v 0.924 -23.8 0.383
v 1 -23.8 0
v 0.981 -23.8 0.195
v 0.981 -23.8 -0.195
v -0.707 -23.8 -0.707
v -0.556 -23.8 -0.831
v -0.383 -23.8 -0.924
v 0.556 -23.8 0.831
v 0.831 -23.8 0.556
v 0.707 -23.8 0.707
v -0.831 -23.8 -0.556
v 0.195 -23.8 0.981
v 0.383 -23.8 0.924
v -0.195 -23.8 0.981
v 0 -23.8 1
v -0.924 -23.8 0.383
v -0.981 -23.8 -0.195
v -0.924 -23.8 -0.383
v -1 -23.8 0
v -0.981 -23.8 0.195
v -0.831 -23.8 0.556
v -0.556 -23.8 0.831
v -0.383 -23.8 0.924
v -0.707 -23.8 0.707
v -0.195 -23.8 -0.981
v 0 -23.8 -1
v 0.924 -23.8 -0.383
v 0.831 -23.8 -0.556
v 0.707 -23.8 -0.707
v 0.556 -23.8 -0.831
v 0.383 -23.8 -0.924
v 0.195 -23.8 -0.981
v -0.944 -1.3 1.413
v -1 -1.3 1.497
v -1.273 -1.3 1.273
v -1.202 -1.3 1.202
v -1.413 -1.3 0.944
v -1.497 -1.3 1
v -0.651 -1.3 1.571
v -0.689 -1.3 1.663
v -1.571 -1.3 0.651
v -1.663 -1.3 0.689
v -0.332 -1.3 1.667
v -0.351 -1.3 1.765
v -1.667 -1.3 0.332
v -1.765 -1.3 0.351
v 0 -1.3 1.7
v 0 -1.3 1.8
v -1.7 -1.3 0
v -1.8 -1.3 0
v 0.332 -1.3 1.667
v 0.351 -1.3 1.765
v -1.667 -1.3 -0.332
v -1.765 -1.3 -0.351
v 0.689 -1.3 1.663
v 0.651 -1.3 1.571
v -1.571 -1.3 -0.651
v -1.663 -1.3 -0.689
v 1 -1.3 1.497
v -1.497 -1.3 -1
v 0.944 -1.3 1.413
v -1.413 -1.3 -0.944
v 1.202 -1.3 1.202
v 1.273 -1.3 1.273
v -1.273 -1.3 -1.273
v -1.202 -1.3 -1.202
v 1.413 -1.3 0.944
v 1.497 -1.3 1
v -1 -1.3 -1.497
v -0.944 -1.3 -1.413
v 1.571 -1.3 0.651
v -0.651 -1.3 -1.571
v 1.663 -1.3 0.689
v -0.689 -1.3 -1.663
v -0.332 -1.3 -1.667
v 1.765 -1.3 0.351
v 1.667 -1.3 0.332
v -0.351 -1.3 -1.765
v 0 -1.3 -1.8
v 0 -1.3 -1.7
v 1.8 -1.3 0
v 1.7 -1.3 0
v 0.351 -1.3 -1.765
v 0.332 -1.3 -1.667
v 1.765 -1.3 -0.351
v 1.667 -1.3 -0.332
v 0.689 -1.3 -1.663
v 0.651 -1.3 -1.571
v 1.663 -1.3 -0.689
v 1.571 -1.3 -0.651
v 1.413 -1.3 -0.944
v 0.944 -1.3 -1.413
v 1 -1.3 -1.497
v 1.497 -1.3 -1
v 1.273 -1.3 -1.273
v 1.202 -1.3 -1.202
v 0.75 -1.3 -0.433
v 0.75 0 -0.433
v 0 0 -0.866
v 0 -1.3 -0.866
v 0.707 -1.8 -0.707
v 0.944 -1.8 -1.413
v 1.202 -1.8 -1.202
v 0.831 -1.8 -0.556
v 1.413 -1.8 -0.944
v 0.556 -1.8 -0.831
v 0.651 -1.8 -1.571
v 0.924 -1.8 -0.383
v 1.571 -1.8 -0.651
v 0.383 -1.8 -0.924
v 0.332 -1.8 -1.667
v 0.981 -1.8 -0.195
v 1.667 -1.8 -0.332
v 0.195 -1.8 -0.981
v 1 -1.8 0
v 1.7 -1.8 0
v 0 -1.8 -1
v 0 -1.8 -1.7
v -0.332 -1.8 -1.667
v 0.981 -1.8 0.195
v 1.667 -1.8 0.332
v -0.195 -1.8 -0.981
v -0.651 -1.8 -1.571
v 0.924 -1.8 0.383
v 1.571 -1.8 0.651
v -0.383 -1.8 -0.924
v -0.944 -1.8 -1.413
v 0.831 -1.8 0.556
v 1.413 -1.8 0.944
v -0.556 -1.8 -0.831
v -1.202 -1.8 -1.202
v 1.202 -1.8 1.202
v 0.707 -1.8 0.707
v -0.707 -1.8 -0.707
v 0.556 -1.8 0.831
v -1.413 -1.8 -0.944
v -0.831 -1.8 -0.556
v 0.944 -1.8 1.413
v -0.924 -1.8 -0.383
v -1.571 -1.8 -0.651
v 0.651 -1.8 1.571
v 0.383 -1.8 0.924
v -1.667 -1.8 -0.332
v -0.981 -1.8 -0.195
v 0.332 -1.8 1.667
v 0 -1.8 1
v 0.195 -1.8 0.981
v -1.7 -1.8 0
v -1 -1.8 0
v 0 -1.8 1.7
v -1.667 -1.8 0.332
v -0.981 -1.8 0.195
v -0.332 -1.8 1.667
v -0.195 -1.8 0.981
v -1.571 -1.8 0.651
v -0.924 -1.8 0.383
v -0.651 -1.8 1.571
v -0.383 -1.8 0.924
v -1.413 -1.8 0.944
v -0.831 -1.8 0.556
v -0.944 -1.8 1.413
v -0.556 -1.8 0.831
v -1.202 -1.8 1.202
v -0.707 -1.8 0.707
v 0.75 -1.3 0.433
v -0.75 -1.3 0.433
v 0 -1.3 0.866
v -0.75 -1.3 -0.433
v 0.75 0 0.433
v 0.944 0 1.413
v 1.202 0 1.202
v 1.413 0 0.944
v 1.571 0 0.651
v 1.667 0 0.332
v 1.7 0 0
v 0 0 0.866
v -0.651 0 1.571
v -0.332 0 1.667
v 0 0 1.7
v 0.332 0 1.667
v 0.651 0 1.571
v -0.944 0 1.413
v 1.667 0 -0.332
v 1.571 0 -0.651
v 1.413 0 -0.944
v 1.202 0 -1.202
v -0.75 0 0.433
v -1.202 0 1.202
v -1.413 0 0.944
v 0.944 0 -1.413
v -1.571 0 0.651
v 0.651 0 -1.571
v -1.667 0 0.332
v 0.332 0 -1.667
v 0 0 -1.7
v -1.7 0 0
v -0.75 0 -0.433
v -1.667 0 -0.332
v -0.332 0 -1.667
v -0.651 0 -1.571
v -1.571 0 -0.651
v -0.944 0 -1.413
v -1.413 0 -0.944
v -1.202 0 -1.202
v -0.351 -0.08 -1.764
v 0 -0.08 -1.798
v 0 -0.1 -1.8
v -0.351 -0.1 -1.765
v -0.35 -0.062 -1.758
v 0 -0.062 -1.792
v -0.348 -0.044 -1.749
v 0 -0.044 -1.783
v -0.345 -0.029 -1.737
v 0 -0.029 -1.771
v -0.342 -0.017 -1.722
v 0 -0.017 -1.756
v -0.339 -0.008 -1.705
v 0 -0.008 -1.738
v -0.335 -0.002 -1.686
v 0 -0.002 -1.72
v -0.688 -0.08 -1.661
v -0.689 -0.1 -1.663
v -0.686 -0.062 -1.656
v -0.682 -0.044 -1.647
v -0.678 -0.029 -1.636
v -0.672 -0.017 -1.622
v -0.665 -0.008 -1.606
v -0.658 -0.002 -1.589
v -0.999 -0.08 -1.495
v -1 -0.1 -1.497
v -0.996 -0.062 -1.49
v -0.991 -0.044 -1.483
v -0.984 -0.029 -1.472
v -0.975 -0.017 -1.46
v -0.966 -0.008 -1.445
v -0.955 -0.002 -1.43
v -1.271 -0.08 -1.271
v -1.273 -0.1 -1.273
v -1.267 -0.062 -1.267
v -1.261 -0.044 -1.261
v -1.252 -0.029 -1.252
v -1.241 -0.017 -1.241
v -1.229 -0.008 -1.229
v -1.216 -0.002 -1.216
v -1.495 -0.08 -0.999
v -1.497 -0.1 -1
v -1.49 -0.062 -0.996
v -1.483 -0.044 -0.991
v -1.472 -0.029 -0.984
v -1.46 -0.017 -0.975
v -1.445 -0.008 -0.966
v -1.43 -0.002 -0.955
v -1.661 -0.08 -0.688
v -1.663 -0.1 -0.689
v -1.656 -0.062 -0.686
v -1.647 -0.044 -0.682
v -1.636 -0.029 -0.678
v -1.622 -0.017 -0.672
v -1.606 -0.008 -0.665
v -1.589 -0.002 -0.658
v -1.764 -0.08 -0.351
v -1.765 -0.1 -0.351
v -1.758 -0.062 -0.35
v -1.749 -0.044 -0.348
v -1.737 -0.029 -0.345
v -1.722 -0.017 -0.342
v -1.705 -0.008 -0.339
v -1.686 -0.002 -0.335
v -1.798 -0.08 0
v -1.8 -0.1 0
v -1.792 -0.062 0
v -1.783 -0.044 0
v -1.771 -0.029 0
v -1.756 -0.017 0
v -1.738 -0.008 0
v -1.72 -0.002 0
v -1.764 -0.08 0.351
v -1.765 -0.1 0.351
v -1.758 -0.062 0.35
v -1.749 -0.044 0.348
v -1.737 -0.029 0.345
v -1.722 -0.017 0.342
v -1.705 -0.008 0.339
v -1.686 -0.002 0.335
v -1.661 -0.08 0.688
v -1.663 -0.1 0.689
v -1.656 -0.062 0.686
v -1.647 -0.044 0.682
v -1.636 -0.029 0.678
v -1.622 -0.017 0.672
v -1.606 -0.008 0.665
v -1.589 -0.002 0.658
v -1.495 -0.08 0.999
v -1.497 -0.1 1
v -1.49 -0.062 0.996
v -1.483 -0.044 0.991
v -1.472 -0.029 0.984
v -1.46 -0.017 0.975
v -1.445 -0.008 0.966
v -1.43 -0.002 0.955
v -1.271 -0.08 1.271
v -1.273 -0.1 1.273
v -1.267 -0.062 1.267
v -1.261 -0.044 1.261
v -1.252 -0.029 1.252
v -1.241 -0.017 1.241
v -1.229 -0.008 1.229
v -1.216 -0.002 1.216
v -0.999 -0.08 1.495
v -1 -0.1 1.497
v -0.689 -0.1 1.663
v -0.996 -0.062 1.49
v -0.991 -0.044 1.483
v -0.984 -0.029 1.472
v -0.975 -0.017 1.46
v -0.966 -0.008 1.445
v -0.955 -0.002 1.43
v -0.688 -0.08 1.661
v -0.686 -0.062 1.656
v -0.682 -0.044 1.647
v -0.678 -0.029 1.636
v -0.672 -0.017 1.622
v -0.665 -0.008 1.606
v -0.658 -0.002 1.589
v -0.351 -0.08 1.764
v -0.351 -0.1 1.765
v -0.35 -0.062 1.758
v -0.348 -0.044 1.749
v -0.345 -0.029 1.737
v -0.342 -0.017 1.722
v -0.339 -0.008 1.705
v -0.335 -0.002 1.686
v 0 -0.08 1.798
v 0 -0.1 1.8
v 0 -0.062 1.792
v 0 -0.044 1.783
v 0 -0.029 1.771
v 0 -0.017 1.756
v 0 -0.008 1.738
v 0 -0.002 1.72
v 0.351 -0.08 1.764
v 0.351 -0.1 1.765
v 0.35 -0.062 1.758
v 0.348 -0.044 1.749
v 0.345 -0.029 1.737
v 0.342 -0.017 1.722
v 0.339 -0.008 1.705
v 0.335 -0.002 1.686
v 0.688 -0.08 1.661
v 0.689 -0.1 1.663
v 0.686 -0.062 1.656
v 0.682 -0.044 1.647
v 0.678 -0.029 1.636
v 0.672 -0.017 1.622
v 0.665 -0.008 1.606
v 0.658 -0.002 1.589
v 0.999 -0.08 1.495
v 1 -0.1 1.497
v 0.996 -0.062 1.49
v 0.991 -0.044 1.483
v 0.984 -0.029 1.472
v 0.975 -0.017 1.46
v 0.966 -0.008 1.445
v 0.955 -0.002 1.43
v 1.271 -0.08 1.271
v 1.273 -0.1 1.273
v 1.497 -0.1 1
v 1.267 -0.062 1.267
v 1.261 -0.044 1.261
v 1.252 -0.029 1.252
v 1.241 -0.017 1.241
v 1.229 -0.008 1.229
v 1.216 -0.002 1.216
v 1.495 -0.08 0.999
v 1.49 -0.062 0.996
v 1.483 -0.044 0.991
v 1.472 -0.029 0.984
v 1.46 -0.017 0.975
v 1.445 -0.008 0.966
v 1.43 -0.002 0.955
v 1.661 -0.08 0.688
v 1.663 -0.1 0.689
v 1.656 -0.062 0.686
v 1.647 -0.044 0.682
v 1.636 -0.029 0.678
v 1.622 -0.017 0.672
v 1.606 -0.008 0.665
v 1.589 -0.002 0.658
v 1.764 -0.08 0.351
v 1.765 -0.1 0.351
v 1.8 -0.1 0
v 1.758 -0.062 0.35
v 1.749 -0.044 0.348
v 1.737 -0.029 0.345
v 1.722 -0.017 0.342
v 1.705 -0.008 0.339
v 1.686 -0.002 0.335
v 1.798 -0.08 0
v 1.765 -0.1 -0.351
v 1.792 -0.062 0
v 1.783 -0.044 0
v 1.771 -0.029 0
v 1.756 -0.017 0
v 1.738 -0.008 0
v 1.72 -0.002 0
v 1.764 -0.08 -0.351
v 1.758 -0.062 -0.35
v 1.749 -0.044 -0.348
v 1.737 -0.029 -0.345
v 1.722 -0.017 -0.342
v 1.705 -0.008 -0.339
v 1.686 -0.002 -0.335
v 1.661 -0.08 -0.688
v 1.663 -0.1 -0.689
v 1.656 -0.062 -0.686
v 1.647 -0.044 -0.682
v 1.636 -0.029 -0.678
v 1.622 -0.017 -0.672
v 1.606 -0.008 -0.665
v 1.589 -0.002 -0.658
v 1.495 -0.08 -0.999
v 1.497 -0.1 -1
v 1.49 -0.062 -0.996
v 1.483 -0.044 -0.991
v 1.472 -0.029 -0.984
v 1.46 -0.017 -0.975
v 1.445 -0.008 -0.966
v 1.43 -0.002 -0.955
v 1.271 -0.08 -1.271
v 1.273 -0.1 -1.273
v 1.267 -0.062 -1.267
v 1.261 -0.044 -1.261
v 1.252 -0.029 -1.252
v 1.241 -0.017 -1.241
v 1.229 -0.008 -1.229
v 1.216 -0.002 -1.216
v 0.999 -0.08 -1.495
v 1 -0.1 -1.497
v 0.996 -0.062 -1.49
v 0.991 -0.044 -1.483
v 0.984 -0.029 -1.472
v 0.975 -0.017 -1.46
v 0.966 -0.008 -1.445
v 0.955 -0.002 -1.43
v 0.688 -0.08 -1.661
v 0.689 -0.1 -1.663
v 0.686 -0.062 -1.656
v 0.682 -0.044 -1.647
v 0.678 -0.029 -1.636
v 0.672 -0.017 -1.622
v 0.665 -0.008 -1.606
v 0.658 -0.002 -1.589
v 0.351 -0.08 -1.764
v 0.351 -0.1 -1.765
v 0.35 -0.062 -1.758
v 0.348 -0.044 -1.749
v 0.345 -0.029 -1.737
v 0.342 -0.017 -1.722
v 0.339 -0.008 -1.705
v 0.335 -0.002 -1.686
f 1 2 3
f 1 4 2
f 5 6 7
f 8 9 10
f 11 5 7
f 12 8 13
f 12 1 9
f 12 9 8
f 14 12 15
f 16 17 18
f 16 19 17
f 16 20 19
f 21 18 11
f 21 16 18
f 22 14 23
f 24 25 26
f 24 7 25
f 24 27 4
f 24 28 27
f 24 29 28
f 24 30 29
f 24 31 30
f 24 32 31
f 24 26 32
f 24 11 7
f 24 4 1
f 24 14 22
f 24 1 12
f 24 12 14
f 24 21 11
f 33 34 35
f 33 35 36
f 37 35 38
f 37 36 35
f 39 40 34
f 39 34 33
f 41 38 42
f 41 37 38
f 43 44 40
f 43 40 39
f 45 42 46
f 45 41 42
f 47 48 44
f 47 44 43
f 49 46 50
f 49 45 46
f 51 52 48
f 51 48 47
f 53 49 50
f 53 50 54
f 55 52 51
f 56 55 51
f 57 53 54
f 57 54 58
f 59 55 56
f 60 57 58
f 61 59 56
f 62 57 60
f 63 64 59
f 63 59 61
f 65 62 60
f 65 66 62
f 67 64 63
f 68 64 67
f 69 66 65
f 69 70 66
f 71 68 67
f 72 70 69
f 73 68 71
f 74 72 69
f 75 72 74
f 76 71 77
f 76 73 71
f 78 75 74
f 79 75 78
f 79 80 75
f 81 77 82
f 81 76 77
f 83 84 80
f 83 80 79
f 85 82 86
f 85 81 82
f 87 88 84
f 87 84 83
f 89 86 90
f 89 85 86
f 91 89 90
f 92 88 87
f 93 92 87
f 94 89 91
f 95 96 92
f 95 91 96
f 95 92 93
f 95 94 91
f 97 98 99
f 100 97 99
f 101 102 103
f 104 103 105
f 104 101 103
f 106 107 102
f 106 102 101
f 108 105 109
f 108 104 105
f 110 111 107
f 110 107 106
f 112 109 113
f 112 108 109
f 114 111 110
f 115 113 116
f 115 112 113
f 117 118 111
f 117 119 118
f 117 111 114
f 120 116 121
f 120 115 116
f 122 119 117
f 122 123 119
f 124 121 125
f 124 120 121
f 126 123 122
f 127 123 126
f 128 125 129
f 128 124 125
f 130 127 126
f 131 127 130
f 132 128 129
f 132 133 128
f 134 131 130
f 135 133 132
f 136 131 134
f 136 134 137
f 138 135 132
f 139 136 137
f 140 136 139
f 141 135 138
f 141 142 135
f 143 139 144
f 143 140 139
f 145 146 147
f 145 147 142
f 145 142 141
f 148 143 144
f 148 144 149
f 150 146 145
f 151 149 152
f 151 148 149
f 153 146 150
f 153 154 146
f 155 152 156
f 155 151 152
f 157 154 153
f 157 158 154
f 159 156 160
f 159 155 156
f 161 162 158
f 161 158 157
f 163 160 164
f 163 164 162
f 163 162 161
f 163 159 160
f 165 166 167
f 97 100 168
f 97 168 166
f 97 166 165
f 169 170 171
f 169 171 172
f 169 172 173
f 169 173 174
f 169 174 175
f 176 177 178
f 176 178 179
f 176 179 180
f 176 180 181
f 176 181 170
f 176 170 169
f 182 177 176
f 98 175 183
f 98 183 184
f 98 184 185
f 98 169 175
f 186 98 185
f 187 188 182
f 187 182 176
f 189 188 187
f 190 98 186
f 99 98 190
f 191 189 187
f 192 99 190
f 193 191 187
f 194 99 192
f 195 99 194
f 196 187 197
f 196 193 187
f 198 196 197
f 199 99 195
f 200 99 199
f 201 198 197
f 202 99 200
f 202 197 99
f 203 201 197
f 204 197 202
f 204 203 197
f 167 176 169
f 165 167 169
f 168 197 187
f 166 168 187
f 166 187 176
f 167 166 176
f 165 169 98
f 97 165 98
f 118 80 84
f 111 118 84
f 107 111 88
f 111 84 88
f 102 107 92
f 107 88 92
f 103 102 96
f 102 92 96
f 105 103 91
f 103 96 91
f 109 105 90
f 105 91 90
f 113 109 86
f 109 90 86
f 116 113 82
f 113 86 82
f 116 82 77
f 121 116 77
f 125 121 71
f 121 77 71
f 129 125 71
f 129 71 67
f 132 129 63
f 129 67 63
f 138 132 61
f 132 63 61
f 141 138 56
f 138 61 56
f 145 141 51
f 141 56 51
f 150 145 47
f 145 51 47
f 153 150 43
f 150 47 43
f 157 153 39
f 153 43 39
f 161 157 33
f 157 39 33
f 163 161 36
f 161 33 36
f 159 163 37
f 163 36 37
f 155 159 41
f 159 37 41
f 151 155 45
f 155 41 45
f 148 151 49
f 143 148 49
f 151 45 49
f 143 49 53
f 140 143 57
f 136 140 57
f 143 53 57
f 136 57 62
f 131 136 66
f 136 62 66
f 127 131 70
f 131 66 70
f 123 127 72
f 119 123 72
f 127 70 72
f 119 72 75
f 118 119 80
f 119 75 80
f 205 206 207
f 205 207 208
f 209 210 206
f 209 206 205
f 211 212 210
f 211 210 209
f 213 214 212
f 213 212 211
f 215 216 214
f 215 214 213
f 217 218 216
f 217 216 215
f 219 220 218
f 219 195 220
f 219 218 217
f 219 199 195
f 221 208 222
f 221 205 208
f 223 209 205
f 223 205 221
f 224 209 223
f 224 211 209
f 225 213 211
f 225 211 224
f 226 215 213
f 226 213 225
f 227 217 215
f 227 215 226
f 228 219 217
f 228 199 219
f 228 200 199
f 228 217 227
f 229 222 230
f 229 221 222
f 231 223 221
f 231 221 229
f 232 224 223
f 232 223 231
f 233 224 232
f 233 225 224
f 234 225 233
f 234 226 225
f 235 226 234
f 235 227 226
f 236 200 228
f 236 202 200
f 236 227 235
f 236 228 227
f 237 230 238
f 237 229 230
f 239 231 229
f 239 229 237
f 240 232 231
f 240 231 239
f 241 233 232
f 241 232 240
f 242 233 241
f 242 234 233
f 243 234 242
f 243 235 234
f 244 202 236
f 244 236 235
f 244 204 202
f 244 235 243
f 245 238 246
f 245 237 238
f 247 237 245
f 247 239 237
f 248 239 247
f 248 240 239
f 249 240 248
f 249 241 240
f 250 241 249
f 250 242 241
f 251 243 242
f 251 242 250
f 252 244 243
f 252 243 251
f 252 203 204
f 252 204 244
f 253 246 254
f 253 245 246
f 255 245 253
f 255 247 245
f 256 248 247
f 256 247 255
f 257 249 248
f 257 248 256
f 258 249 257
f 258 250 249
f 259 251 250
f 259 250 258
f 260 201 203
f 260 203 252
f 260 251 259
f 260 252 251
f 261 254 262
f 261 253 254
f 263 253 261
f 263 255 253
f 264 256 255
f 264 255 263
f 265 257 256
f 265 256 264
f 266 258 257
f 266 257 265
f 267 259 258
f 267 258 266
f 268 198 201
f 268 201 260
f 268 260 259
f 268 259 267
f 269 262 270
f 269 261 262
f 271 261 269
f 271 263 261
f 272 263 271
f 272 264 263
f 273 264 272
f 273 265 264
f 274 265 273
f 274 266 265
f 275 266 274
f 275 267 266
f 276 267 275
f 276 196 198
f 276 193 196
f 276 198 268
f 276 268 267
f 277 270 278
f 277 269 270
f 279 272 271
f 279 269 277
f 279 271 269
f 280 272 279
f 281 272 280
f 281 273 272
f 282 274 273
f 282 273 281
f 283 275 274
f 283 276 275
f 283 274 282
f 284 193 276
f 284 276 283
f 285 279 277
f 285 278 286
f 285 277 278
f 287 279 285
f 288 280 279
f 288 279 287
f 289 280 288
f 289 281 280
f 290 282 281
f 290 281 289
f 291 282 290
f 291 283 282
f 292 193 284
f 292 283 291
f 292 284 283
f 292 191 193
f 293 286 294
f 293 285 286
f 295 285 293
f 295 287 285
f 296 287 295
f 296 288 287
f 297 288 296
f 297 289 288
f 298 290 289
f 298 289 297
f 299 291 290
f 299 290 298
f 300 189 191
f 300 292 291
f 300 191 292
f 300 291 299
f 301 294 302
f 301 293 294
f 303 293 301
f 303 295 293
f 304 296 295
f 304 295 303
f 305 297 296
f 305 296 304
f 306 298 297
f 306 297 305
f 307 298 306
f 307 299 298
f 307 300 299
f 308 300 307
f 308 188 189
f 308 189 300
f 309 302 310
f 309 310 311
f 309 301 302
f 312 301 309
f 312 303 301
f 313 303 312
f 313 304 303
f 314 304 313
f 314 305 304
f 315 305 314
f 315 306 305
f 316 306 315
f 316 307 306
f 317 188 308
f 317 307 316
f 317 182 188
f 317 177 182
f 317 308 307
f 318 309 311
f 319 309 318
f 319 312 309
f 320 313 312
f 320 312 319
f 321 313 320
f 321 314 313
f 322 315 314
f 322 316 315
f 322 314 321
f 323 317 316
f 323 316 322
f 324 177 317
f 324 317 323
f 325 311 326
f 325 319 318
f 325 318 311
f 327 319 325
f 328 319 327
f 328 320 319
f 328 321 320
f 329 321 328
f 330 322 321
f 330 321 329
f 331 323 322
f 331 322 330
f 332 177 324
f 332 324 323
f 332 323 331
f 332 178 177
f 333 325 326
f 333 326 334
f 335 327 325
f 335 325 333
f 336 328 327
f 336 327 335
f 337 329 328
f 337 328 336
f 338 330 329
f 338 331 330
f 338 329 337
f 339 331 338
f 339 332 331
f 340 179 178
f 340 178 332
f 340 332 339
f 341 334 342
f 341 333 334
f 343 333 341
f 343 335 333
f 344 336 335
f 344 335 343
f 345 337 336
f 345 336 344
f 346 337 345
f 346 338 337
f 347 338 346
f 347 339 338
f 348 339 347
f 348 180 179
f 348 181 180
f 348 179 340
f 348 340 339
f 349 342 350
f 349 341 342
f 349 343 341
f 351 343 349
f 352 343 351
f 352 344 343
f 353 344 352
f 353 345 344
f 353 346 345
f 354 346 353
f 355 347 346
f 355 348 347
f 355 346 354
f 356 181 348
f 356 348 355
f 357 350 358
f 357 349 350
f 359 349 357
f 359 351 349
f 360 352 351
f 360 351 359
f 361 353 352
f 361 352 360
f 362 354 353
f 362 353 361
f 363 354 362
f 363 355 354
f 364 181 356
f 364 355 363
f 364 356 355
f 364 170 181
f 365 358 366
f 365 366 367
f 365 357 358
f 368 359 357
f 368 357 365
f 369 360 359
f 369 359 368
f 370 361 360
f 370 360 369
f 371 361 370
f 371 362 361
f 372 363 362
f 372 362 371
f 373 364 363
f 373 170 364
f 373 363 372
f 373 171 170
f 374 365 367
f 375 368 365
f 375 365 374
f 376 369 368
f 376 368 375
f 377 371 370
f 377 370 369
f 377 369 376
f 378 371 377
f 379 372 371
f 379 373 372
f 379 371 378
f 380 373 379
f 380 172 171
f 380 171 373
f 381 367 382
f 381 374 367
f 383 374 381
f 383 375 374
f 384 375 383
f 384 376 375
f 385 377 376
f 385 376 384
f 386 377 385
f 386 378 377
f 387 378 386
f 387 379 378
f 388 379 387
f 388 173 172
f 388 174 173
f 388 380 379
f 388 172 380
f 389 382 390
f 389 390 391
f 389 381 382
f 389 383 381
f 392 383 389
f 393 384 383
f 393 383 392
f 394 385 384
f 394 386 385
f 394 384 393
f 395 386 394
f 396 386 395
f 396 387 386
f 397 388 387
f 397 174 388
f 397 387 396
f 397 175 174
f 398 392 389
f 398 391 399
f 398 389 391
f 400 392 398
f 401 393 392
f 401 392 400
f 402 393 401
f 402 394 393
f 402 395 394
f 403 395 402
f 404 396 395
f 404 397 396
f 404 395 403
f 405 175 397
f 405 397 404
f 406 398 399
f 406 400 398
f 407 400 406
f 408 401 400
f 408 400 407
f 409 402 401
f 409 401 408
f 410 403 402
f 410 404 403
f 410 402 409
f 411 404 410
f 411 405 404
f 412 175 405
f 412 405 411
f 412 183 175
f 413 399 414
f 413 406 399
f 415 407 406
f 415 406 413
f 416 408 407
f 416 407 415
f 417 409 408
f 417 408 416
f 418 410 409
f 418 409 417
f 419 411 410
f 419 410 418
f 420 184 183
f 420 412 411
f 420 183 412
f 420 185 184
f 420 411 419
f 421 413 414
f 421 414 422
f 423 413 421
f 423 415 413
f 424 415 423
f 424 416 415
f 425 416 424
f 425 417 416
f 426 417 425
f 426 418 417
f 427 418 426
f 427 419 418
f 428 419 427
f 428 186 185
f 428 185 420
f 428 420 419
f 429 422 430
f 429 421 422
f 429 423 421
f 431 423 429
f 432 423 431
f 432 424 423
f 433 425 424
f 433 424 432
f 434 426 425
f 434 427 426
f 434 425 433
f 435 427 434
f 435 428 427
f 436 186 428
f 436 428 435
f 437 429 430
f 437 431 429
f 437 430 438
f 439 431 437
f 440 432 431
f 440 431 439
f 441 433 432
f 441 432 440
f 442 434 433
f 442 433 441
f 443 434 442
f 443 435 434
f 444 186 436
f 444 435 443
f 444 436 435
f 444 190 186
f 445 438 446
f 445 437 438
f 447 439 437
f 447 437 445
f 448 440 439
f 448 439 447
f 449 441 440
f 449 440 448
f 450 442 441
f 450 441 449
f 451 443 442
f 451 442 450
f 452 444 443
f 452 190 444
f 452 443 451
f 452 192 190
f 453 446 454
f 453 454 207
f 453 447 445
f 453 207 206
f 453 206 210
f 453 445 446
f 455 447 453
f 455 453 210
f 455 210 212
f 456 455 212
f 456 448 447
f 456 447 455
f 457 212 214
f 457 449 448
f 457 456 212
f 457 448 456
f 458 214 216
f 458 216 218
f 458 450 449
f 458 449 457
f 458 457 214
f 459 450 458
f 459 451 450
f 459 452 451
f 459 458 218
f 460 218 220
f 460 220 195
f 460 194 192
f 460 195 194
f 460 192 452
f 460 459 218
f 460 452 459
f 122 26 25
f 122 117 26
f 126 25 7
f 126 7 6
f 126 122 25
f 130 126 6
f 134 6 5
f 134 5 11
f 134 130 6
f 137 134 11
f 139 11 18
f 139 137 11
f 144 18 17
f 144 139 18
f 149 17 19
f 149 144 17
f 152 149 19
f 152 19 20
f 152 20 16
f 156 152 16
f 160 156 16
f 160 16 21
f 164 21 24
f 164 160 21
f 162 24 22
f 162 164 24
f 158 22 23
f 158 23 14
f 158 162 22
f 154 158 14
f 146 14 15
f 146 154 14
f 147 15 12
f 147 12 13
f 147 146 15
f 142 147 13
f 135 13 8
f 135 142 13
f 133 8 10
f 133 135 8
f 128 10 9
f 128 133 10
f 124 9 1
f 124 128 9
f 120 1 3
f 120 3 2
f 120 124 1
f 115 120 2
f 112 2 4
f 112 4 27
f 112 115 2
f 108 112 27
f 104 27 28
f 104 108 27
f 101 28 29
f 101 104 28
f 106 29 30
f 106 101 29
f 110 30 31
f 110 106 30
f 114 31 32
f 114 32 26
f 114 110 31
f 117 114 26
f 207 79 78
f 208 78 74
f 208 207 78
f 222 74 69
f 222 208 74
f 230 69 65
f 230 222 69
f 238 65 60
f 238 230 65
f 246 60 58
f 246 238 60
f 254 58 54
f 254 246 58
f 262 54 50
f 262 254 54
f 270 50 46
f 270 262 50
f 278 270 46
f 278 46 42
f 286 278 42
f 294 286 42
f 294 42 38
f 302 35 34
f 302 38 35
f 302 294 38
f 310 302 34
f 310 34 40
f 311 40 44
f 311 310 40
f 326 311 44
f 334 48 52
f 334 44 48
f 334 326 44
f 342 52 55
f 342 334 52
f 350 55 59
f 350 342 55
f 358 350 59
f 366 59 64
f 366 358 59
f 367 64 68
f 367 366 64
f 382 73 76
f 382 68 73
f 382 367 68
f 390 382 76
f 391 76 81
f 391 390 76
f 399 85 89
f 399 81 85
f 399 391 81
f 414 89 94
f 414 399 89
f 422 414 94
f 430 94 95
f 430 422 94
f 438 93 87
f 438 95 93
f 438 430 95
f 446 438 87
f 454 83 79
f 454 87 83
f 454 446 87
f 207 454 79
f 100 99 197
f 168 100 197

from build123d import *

# Parameters (mm, degrees)
CUT_EXTRUDE1_DEPTH = 1.3
FILLET1_R          = 0.1
CUT_EXTRUDE2_START = -0.5
SKETCH3_R          = 1.8
SKETCH3_R_2        = 1.7
CUT_EXTRUDE2_DEPTH = 0.5


with BuildPart() as part:
    # Sketch1 → Revolve1 (revolve)
    with BuildSketch(Plane(origin=(0, 0, 0), x_dir=(0, 0, -1), z_dir=(1, 0, 0))):
        Polygon((0, 0), (0, -23.8), (1, -23.8), (1, -1.8), (1.8, -1.8), (1.8, 0), align=None)
    revolve(axis=Axis((0, 0, 0), (0, 1, 0)))

    # Sketch2 → Cut-Extrude1 (cut)
    with BuildSketch(Plane(origin=(0, 0, 0), x_dir=(1, 0, 0), z_dir=(0, 1, 0))):
        Polygon((0, 0.866025404), (-0.75, 0.433012702), (-0.75, -0.433012702), (0, -0.866025404), (0.75, -0.433012702), (0.75, 0.433012702), align=None)
    extrude(amount=-CUT_EXTRUDE1_DEPTH, mode=Mode.SUBTRACT)

    # Fillet1
    fillet1_edges = [part.edges().sort_by_distance(p)[0] for p in [
        (0, 0, 1.8),
    ]]
    fillet(fillet1_edges, radius=FILLET1_R)

    # Sketch3 → Cut-Extrude2 (cut)
    with BuildSketch(Plane.XZ.offset(1.8).offset(CUT_EXTRUDE2_START)):
        with Locations(Location((0, 0, 0), (0, 0, 270))):
            Circle(SKETCH3_R)
        with Locations(Location((0, 0, 0), (0, 0, 270))):
            Circle(SKETCH3_R_2, mode=Mode.SUBTRACT)
    extrude(amount=CUT_EXTRUDE2_DEPTH, mode=Mode.SUBTRACT)


solid = part.part
